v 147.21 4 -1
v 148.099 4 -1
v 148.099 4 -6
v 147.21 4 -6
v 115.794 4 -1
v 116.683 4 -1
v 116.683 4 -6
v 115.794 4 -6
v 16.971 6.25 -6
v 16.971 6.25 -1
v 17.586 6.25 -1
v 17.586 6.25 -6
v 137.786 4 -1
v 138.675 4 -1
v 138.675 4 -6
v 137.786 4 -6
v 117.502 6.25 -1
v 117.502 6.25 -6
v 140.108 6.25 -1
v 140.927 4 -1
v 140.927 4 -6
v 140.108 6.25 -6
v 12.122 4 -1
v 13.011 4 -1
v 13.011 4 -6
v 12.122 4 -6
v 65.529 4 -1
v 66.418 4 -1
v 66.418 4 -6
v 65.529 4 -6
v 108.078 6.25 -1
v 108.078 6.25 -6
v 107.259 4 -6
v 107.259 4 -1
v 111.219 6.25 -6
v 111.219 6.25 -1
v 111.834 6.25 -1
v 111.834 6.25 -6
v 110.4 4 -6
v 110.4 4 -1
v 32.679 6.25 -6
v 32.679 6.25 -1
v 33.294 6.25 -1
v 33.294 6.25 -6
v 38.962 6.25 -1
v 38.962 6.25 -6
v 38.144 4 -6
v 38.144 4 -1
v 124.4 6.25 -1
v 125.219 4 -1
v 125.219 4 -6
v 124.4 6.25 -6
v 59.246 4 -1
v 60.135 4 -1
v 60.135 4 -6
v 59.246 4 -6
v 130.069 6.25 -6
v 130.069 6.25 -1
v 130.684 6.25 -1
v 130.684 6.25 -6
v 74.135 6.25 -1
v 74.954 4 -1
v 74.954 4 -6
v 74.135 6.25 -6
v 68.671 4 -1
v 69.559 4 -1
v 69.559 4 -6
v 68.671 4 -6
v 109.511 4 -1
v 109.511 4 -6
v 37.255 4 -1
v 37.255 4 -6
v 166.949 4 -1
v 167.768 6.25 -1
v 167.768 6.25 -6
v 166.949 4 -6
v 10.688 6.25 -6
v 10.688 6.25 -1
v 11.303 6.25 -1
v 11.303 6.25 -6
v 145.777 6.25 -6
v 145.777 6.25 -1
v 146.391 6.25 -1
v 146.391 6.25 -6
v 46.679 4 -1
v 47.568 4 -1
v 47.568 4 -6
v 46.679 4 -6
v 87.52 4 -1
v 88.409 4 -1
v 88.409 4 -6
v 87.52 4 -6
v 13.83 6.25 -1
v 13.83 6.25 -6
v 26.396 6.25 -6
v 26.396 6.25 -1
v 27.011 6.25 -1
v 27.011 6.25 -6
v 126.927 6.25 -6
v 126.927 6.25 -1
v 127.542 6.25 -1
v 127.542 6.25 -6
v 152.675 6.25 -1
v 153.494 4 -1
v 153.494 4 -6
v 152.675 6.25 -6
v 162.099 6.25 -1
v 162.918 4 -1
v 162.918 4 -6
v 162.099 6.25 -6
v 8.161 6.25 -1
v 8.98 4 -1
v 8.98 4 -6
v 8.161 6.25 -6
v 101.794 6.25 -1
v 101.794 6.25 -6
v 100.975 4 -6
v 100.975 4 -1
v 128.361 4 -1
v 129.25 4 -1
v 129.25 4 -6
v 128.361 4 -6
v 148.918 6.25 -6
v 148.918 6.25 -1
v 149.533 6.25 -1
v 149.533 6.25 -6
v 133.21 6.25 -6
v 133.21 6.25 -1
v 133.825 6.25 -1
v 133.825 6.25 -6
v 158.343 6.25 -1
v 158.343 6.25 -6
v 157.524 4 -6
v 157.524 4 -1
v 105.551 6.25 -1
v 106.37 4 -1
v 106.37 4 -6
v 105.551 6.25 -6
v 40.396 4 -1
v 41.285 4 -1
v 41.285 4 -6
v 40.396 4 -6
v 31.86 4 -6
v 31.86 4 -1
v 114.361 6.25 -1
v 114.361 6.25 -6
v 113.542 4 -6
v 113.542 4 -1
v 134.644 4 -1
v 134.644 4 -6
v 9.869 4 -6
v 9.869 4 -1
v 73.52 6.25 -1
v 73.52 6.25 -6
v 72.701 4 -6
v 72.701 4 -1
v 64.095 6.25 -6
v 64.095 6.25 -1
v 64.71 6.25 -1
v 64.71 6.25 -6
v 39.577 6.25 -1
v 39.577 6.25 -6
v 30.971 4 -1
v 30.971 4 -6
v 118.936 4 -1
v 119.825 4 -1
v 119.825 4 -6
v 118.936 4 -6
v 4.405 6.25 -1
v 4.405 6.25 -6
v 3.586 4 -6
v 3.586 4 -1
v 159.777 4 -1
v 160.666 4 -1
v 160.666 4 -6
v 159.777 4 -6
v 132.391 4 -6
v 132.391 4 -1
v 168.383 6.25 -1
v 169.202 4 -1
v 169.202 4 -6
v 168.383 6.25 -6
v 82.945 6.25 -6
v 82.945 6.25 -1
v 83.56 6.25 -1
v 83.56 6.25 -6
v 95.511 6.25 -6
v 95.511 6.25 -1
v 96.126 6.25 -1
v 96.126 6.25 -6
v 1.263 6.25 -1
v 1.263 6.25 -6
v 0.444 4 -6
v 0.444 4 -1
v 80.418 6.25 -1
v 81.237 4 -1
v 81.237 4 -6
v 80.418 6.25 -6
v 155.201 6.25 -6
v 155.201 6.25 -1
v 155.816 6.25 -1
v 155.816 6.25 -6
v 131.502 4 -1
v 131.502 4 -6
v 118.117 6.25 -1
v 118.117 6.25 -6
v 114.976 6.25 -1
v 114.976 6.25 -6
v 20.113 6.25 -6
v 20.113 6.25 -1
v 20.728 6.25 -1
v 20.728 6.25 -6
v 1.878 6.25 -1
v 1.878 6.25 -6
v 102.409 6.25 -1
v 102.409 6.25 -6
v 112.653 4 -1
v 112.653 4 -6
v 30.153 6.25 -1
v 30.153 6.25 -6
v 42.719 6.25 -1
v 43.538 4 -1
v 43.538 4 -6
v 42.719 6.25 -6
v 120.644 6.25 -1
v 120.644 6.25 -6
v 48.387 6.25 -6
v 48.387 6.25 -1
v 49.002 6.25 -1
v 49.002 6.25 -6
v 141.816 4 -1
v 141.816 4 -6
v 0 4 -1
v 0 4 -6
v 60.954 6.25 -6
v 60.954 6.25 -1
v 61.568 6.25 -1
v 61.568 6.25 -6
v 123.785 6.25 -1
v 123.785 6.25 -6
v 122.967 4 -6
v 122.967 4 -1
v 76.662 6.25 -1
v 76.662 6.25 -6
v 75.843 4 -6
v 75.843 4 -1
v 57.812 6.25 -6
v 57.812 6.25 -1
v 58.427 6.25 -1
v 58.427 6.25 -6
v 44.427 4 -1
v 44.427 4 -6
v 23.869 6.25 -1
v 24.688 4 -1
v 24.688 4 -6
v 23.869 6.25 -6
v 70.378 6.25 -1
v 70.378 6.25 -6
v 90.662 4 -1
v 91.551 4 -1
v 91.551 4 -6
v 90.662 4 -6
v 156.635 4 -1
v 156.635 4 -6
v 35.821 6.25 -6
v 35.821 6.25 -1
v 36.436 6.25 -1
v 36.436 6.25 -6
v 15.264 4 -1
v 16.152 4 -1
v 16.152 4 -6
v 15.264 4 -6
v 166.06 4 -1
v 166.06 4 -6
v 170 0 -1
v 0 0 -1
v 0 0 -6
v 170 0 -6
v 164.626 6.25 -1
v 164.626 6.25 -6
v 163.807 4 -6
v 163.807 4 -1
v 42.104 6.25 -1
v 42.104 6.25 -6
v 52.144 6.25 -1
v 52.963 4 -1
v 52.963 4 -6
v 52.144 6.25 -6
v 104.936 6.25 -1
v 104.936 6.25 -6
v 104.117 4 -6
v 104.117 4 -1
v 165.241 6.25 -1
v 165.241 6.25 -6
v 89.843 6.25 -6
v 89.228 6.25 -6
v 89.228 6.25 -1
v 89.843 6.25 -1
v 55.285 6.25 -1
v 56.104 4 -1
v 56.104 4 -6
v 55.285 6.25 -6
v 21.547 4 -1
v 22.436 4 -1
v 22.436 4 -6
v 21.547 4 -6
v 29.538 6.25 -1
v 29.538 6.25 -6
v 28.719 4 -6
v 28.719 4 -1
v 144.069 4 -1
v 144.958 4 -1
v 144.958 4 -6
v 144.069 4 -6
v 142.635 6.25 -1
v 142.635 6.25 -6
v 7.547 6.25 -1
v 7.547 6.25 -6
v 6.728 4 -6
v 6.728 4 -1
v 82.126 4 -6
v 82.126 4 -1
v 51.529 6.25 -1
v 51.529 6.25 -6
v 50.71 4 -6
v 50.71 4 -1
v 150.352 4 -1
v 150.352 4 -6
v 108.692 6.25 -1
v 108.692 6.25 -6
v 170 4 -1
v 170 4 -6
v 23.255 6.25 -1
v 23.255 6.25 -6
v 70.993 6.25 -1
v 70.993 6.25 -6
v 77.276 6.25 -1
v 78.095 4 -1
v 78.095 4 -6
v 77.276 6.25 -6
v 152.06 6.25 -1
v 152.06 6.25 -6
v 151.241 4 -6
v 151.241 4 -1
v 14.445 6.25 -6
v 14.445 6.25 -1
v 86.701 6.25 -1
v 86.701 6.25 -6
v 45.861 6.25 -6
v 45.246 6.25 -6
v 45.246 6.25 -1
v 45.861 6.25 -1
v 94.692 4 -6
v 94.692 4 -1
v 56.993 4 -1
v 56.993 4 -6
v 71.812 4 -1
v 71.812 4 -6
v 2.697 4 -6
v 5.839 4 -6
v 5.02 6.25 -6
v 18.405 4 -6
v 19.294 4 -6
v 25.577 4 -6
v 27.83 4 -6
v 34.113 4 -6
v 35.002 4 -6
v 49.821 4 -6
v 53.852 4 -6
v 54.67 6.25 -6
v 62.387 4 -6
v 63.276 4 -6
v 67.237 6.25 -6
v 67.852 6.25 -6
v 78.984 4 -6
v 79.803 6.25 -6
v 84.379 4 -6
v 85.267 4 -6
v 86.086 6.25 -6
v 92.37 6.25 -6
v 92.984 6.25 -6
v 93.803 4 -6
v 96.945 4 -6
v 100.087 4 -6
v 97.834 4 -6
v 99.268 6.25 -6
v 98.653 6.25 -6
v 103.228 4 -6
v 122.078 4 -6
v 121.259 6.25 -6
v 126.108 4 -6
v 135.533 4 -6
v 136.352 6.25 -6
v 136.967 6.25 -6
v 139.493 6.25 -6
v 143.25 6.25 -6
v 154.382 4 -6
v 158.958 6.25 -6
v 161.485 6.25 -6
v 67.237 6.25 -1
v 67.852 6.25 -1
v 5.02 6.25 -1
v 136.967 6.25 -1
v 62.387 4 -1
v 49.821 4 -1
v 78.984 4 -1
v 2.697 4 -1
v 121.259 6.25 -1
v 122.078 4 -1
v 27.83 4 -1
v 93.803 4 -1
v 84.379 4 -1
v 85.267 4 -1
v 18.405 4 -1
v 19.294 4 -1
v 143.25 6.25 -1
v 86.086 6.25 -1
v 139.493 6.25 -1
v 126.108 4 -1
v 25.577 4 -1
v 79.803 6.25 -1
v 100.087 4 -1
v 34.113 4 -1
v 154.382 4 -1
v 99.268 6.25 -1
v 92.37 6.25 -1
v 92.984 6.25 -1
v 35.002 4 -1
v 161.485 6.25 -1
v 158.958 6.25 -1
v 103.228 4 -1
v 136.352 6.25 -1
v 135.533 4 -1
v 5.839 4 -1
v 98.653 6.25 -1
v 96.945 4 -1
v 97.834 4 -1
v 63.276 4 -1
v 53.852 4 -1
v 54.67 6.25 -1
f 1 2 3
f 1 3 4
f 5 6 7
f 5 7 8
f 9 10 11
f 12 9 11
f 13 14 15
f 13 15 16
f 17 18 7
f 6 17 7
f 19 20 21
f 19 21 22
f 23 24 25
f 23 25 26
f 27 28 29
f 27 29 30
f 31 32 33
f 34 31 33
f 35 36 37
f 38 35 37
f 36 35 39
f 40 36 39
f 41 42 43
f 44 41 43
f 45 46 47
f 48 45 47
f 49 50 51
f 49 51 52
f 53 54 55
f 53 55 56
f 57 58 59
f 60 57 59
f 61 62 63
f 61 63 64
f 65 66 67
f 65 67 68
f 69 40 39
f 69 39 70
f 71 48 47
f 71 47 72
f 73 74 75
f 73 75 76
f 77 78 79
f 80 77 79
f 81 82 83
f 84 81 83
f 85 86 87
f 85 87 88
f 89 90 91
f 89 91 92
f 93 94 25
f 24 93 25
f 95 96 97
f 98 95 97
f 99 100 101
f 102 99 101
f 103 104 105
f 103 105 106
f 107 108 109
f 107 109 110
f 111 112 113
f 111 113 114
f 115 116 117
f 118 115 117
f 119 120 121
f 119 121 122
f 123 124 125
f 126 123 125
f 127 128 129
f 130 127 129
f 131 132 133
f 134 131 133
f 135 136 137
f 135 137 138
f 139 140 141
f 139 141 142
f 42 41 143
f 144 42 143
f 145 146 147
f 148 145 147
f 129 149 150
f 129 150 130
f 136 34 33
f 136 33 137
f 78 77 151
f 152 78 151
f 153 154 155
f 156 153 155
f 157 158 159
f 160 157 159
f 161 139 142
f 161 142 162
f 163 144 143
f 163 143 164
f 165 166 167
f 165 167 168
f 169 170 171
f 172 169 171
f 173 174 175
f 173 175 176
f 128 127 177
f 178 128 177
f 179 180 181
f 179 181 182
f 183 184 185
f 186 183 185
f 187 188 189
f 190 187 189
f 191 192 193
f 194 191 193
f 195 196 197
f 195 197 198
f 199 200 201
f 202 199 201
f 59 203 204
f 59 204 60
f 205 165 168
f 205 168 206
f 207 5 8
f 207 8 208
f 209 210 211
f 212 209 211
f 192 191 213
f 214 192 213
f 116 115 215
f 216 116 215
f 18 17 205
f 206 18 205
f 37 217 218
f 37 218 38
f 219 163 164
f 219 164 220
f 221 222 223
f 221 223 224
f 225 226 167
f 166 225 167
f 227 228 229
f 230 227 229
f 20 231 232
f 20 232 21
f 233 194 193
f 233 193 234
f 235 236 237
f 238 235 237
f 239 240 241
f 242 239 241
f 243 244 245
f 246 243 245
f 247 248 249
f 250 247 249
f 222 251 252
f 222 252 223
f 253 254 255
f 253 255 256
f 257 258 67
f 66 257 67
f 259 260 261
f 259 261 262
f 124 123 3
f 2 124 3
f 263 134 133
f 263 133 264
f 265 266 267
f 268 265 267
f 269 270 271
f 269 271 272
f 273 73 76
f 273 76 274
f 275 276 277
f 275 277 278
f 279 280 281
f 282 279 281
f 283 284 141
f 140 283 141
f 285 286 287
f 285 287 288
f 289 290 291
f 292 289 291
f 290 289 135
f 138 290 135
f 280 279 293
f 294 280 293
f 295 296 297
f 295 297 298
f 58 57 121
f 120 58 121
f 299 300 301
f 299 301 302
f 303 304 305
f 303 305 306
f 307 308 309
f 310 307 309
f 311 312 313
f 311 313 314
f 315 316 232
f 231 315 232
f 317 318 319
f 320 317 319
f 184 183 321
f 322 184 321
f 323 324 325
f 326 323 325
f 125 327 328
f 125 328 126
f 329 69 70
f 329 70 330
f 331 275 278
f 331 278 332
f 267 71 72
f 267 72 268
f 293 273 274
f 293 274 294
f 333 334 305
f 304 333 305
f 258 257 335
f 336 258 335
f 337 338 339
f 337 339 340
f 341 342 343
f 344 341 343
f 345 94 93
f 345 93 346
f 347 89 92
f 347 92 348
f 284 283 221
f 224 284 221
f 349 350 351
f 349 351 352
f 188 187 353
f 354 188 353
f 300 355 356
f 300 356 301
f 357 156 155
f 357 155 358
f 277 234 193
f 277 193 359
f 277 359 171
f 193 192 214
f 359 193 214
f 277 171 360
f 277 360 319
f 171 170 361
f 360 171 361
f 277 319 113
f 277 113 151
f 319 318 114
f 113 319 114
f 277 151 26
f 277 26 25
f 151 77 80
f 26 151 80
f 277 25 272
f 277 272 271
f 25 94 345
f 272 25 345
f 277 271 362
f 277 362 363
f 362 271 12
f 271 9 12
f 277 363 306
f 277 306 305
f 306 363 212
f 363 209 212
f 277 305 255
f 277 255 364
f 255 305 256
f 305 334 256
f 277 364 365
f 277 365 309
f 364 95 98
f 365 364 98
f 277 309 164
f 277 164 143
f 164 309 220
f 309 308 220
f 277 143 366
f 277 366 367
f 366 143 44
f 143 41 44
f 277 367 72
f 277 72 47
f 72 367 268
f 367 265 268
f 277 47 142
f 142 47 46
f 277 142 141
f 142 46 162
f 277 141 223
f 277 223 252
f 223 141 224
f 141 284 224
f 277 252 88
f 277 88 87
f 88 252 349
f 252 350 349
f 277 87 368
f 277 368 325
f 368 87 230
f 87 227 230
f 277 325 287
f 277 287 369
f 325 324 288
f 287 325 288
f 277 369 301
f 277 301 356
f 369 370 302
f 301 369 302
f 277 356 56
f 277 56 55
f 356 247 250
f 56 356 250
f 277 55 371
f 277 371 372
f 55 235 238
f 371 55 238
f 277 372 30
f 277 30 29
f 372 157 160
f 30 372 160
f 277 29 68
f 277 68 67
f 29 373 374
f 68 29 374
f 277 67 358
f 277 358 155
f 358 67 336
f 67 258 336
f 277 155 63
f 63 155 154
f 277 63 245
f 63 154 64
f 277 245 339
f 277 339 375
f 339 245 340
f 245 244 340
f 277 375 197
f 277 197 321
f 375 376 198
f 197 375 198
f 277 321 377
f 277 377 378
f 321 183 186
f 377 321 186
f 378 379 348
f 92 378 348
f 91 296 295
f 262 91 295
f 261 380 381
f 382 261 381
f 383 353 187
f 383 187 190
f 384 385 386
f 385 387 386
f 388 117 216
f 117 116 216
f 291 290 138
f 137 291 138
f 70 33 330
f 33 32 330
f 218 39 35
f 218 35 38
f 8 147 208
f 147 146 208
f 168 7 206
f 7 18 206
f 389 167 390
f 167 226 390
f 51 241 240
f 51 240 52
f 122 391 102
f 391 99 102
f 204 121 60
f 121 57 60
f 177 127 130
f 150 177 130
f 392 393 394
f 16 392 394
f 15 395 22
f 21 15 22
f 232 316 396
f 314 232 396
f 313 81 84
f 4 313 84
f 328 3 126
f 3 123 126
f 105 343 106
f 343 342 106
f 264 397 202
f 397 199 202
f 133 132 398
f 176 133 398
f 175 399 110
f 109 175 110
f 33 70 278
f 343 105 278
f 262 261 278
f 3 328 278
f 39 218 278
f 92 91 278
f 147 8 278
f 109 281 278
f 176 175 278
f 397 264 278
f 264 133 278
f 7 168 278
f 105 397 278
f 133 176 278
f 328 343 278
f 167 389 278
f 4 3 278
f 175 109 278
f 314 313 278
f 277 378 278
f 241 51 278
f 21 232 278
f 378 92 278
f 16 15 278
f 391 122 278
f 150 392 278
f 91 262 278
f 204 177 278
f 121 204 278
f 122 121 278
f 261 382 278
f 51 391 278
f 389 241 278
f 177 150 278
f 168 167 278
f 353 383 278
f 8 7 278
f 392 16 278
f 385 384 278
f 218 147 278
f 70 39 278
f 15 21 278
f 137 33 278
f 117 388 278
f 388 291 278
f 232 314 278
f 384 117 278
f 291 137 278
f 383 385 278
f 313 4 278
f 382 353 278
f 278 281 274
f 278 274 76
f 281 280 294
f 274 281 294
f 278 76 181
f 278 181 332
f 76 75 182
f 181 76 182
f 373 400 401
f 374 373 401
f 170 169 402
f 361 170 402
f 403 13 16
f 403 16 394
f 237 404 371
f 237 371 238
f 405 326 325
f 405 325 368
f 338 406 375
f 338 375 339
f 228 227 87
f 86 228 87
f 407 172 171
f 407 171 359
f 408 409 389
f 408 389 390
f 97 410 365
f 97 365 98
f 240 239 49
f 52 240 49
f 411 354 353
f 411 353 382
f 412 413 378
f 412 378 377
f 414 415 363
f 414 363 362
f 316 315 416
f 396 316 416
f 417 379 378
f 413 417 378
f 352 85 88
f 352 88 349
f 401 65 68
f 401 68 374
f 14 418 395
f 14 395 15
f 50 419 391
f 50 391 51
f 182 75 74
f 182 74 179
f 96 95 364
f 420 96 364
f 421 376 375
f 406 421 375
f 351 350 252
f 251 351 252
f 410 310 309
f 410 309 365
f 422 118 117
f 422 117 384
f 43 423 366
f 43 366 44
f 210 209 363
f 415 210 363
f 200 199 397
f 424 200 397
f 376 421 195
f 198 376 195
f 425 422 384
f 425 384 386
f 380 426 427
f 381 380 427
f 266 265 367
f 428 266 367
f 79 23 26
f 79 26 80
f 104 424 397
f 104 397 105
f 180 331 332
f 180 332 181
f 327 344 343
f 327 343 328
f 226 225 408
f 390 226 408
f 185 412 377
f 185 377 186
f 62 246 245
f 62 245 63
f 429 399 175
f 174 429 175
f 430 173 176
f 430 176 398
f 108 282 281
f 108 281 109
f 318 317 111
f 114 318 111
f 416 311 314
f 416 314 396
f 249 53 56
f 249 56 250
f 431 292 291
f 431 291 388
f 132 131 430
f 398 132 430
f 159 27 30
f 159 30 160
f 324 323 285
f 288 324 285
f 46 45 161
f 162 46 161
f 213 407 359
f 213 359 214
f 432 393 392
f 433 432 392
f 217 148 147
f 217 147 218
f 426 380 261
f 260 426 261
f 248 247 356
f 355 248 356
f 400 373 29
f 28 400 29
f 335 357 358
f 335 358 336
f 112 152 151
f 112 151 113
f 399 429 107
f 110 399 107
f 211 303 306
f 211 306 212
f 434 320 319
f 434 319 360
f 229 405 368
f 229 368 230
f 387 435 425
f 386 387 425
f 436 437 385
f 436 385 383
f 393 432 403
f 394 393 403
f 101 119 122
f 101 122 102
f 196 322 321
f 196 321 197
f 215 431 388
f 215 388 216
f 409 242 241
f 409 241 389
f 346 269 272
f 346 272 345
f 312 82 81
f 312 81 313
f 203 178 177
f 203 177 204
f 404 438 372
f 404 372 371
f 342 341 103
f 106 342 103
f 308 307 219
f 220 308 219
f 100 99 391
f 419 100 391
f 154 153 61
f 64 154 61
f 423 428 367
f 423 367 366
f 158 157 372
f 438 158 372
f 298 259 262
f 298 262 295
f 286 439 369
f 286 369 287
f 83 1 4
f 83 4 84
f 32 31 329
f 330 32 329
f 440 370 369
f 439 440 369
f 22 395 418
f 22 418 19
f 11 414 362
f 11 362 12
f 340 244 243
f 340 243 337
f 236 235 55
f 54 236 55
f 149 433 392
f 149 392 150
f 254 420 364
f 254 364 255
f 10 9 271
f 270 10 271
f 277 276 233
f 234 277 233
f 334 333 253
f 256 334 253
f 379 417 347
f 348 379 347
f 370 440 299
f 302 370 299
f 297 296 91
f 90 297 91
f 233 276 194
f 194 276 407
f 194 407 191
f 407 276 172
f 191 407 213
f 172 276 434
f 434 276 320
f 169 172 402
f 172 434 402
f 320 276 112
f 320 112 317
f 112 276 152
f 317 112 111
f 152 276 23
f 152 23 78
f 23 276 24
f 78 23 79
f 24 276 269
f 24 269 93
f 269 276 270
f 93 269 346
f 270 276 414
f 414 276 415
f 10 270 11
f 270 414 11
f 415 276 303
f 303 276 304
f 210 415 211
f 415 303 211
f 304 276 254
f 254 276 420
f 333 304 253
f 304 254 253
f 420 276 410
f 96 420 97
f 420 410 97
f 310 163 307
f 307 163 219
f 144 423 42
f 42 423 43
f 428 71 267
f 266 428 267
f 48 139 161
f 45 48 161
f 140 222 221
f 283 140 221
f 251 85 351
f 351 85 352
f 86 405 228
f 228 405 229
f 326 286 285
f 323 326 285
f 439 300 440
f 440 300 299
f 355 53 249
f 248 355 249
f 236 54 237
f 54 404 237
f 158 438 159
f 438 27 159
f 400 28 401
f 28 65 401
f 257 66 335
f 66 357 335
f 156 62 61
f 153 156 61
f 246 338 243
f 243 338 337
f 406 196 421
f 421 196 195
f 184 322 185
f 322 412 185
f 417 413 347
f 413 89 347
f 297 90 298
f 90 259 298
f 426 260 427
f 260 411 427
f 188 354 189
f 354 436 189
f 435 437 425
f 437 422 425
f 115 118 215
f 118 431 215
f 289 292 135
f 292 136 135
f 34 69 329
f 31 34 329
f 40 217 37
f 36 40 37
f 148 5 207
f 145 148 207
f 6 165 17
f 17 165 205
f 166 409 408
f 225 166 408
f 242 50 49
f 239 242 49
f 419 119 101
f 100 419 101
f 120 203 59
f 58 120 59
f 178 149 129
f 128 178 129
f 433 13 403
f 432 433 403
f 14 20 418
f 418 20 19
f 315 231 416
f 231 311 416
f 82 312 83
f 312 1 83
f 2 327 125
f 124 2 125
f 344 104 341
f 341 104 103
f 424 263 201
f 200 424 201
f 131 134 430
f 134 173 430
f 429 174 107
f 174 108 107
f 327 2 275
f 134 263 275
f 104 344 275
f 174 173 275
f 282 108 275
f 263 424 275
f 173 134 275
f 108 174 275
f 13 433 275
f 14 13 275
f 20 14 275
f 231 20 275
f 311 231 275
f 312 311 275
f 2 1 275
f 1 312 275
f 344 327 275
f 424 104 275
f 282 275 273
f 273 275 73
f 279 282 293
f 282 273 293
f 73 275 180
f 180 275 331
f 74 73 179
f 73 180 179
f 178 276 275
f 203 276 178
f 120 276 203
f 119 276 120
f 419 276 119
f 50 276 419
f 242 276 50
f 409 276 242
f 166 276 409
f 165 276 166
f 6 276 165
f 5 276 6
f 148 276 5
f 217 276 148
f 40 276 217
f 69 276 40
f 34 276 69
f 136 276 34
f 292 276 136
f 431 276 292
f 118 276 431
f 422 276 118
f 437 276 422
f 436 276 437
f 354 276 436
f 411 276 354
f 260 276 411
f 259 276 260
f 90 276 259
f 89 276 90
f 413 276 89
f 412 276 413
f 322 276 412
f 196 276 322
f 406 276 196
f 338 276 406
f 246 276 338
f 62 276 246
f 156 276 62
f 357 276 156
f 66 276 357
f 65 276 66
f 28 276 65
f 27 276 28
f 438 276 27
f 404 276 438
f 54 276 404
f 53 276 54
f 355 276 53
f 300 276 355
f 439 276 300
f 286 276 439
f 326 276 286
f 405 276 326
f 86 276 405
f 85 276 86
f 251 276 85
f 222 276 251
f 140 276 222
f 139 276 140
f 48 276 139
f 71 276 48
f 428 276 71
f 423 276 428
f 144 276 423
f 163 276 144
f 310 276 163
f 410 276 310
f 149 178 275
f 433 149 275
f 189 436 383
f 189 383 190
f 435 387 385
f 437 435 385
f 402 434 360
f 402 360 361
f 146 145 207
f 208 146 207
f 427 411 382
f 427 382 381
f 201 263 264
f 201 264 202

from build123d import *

# Parameters (mm, degrees)
BLANKSKE_W         = 170
BLANKSKE_H         = 6.25
BLANK_DEPTH        = 6
TOOTHCUTSIM_DEPTH  = 171.220628891
TEETHCUTS_COUNT    = 55
TEETHCUTS_PITCH    = 3.14159265
SKETCH1_W          = 1
SKETCH1_H          = 6.25
CUT_EXTRUDE1_DEPTH = 171.220628891


with BuildPart() as part:
    # BlankSke → Blank (new body)
    with BuildSketch(Plane.XY):
        with Locations((85, 3.125)):
            Rectangle(BLANKSKE_W, BLANKSKE_H)
    extrude(amount=-BLANK_DEPTH)

    # TooCutSkeSim → ToothCutSim (cut, through all)
    with BuildSketch(Plane.XY):
        Polygon((0.44443537, 4), (-0.44443537, 4), (-1.272613241, 6.2754), (1.272613241, 6.2754), align=None)
    toothcutsim = extrude(amount=-TOOTHCUTSIM_DEPTH, mode=Mode.SUBTRACT)

    # TeethCuts: ToothCutSim ×55
    with Locations(*[(i * TEETHCUTS_PITCH, 0, 0) for i in range(1, TEETHCUTS_COUNT)]):
        add(toothcutsim, mode=Mode.SUBTRACT)

    # Sketch1 → Cut-Extrude1 (cut, through all)
    with BuildSketch(Plane(origin=(170, 0, 0), x_dir=(0, 0, -1), z_dir=(1, 0, 0))):
        with Locations((0.5, 3.125)):
            Rectangle(SKETCH1_W, SKETCH1_H)
    extrude(amount=-CUT_EXTRUDE1_DEPTH, mode=Mode.SUBTRACT)


solid = part.part
